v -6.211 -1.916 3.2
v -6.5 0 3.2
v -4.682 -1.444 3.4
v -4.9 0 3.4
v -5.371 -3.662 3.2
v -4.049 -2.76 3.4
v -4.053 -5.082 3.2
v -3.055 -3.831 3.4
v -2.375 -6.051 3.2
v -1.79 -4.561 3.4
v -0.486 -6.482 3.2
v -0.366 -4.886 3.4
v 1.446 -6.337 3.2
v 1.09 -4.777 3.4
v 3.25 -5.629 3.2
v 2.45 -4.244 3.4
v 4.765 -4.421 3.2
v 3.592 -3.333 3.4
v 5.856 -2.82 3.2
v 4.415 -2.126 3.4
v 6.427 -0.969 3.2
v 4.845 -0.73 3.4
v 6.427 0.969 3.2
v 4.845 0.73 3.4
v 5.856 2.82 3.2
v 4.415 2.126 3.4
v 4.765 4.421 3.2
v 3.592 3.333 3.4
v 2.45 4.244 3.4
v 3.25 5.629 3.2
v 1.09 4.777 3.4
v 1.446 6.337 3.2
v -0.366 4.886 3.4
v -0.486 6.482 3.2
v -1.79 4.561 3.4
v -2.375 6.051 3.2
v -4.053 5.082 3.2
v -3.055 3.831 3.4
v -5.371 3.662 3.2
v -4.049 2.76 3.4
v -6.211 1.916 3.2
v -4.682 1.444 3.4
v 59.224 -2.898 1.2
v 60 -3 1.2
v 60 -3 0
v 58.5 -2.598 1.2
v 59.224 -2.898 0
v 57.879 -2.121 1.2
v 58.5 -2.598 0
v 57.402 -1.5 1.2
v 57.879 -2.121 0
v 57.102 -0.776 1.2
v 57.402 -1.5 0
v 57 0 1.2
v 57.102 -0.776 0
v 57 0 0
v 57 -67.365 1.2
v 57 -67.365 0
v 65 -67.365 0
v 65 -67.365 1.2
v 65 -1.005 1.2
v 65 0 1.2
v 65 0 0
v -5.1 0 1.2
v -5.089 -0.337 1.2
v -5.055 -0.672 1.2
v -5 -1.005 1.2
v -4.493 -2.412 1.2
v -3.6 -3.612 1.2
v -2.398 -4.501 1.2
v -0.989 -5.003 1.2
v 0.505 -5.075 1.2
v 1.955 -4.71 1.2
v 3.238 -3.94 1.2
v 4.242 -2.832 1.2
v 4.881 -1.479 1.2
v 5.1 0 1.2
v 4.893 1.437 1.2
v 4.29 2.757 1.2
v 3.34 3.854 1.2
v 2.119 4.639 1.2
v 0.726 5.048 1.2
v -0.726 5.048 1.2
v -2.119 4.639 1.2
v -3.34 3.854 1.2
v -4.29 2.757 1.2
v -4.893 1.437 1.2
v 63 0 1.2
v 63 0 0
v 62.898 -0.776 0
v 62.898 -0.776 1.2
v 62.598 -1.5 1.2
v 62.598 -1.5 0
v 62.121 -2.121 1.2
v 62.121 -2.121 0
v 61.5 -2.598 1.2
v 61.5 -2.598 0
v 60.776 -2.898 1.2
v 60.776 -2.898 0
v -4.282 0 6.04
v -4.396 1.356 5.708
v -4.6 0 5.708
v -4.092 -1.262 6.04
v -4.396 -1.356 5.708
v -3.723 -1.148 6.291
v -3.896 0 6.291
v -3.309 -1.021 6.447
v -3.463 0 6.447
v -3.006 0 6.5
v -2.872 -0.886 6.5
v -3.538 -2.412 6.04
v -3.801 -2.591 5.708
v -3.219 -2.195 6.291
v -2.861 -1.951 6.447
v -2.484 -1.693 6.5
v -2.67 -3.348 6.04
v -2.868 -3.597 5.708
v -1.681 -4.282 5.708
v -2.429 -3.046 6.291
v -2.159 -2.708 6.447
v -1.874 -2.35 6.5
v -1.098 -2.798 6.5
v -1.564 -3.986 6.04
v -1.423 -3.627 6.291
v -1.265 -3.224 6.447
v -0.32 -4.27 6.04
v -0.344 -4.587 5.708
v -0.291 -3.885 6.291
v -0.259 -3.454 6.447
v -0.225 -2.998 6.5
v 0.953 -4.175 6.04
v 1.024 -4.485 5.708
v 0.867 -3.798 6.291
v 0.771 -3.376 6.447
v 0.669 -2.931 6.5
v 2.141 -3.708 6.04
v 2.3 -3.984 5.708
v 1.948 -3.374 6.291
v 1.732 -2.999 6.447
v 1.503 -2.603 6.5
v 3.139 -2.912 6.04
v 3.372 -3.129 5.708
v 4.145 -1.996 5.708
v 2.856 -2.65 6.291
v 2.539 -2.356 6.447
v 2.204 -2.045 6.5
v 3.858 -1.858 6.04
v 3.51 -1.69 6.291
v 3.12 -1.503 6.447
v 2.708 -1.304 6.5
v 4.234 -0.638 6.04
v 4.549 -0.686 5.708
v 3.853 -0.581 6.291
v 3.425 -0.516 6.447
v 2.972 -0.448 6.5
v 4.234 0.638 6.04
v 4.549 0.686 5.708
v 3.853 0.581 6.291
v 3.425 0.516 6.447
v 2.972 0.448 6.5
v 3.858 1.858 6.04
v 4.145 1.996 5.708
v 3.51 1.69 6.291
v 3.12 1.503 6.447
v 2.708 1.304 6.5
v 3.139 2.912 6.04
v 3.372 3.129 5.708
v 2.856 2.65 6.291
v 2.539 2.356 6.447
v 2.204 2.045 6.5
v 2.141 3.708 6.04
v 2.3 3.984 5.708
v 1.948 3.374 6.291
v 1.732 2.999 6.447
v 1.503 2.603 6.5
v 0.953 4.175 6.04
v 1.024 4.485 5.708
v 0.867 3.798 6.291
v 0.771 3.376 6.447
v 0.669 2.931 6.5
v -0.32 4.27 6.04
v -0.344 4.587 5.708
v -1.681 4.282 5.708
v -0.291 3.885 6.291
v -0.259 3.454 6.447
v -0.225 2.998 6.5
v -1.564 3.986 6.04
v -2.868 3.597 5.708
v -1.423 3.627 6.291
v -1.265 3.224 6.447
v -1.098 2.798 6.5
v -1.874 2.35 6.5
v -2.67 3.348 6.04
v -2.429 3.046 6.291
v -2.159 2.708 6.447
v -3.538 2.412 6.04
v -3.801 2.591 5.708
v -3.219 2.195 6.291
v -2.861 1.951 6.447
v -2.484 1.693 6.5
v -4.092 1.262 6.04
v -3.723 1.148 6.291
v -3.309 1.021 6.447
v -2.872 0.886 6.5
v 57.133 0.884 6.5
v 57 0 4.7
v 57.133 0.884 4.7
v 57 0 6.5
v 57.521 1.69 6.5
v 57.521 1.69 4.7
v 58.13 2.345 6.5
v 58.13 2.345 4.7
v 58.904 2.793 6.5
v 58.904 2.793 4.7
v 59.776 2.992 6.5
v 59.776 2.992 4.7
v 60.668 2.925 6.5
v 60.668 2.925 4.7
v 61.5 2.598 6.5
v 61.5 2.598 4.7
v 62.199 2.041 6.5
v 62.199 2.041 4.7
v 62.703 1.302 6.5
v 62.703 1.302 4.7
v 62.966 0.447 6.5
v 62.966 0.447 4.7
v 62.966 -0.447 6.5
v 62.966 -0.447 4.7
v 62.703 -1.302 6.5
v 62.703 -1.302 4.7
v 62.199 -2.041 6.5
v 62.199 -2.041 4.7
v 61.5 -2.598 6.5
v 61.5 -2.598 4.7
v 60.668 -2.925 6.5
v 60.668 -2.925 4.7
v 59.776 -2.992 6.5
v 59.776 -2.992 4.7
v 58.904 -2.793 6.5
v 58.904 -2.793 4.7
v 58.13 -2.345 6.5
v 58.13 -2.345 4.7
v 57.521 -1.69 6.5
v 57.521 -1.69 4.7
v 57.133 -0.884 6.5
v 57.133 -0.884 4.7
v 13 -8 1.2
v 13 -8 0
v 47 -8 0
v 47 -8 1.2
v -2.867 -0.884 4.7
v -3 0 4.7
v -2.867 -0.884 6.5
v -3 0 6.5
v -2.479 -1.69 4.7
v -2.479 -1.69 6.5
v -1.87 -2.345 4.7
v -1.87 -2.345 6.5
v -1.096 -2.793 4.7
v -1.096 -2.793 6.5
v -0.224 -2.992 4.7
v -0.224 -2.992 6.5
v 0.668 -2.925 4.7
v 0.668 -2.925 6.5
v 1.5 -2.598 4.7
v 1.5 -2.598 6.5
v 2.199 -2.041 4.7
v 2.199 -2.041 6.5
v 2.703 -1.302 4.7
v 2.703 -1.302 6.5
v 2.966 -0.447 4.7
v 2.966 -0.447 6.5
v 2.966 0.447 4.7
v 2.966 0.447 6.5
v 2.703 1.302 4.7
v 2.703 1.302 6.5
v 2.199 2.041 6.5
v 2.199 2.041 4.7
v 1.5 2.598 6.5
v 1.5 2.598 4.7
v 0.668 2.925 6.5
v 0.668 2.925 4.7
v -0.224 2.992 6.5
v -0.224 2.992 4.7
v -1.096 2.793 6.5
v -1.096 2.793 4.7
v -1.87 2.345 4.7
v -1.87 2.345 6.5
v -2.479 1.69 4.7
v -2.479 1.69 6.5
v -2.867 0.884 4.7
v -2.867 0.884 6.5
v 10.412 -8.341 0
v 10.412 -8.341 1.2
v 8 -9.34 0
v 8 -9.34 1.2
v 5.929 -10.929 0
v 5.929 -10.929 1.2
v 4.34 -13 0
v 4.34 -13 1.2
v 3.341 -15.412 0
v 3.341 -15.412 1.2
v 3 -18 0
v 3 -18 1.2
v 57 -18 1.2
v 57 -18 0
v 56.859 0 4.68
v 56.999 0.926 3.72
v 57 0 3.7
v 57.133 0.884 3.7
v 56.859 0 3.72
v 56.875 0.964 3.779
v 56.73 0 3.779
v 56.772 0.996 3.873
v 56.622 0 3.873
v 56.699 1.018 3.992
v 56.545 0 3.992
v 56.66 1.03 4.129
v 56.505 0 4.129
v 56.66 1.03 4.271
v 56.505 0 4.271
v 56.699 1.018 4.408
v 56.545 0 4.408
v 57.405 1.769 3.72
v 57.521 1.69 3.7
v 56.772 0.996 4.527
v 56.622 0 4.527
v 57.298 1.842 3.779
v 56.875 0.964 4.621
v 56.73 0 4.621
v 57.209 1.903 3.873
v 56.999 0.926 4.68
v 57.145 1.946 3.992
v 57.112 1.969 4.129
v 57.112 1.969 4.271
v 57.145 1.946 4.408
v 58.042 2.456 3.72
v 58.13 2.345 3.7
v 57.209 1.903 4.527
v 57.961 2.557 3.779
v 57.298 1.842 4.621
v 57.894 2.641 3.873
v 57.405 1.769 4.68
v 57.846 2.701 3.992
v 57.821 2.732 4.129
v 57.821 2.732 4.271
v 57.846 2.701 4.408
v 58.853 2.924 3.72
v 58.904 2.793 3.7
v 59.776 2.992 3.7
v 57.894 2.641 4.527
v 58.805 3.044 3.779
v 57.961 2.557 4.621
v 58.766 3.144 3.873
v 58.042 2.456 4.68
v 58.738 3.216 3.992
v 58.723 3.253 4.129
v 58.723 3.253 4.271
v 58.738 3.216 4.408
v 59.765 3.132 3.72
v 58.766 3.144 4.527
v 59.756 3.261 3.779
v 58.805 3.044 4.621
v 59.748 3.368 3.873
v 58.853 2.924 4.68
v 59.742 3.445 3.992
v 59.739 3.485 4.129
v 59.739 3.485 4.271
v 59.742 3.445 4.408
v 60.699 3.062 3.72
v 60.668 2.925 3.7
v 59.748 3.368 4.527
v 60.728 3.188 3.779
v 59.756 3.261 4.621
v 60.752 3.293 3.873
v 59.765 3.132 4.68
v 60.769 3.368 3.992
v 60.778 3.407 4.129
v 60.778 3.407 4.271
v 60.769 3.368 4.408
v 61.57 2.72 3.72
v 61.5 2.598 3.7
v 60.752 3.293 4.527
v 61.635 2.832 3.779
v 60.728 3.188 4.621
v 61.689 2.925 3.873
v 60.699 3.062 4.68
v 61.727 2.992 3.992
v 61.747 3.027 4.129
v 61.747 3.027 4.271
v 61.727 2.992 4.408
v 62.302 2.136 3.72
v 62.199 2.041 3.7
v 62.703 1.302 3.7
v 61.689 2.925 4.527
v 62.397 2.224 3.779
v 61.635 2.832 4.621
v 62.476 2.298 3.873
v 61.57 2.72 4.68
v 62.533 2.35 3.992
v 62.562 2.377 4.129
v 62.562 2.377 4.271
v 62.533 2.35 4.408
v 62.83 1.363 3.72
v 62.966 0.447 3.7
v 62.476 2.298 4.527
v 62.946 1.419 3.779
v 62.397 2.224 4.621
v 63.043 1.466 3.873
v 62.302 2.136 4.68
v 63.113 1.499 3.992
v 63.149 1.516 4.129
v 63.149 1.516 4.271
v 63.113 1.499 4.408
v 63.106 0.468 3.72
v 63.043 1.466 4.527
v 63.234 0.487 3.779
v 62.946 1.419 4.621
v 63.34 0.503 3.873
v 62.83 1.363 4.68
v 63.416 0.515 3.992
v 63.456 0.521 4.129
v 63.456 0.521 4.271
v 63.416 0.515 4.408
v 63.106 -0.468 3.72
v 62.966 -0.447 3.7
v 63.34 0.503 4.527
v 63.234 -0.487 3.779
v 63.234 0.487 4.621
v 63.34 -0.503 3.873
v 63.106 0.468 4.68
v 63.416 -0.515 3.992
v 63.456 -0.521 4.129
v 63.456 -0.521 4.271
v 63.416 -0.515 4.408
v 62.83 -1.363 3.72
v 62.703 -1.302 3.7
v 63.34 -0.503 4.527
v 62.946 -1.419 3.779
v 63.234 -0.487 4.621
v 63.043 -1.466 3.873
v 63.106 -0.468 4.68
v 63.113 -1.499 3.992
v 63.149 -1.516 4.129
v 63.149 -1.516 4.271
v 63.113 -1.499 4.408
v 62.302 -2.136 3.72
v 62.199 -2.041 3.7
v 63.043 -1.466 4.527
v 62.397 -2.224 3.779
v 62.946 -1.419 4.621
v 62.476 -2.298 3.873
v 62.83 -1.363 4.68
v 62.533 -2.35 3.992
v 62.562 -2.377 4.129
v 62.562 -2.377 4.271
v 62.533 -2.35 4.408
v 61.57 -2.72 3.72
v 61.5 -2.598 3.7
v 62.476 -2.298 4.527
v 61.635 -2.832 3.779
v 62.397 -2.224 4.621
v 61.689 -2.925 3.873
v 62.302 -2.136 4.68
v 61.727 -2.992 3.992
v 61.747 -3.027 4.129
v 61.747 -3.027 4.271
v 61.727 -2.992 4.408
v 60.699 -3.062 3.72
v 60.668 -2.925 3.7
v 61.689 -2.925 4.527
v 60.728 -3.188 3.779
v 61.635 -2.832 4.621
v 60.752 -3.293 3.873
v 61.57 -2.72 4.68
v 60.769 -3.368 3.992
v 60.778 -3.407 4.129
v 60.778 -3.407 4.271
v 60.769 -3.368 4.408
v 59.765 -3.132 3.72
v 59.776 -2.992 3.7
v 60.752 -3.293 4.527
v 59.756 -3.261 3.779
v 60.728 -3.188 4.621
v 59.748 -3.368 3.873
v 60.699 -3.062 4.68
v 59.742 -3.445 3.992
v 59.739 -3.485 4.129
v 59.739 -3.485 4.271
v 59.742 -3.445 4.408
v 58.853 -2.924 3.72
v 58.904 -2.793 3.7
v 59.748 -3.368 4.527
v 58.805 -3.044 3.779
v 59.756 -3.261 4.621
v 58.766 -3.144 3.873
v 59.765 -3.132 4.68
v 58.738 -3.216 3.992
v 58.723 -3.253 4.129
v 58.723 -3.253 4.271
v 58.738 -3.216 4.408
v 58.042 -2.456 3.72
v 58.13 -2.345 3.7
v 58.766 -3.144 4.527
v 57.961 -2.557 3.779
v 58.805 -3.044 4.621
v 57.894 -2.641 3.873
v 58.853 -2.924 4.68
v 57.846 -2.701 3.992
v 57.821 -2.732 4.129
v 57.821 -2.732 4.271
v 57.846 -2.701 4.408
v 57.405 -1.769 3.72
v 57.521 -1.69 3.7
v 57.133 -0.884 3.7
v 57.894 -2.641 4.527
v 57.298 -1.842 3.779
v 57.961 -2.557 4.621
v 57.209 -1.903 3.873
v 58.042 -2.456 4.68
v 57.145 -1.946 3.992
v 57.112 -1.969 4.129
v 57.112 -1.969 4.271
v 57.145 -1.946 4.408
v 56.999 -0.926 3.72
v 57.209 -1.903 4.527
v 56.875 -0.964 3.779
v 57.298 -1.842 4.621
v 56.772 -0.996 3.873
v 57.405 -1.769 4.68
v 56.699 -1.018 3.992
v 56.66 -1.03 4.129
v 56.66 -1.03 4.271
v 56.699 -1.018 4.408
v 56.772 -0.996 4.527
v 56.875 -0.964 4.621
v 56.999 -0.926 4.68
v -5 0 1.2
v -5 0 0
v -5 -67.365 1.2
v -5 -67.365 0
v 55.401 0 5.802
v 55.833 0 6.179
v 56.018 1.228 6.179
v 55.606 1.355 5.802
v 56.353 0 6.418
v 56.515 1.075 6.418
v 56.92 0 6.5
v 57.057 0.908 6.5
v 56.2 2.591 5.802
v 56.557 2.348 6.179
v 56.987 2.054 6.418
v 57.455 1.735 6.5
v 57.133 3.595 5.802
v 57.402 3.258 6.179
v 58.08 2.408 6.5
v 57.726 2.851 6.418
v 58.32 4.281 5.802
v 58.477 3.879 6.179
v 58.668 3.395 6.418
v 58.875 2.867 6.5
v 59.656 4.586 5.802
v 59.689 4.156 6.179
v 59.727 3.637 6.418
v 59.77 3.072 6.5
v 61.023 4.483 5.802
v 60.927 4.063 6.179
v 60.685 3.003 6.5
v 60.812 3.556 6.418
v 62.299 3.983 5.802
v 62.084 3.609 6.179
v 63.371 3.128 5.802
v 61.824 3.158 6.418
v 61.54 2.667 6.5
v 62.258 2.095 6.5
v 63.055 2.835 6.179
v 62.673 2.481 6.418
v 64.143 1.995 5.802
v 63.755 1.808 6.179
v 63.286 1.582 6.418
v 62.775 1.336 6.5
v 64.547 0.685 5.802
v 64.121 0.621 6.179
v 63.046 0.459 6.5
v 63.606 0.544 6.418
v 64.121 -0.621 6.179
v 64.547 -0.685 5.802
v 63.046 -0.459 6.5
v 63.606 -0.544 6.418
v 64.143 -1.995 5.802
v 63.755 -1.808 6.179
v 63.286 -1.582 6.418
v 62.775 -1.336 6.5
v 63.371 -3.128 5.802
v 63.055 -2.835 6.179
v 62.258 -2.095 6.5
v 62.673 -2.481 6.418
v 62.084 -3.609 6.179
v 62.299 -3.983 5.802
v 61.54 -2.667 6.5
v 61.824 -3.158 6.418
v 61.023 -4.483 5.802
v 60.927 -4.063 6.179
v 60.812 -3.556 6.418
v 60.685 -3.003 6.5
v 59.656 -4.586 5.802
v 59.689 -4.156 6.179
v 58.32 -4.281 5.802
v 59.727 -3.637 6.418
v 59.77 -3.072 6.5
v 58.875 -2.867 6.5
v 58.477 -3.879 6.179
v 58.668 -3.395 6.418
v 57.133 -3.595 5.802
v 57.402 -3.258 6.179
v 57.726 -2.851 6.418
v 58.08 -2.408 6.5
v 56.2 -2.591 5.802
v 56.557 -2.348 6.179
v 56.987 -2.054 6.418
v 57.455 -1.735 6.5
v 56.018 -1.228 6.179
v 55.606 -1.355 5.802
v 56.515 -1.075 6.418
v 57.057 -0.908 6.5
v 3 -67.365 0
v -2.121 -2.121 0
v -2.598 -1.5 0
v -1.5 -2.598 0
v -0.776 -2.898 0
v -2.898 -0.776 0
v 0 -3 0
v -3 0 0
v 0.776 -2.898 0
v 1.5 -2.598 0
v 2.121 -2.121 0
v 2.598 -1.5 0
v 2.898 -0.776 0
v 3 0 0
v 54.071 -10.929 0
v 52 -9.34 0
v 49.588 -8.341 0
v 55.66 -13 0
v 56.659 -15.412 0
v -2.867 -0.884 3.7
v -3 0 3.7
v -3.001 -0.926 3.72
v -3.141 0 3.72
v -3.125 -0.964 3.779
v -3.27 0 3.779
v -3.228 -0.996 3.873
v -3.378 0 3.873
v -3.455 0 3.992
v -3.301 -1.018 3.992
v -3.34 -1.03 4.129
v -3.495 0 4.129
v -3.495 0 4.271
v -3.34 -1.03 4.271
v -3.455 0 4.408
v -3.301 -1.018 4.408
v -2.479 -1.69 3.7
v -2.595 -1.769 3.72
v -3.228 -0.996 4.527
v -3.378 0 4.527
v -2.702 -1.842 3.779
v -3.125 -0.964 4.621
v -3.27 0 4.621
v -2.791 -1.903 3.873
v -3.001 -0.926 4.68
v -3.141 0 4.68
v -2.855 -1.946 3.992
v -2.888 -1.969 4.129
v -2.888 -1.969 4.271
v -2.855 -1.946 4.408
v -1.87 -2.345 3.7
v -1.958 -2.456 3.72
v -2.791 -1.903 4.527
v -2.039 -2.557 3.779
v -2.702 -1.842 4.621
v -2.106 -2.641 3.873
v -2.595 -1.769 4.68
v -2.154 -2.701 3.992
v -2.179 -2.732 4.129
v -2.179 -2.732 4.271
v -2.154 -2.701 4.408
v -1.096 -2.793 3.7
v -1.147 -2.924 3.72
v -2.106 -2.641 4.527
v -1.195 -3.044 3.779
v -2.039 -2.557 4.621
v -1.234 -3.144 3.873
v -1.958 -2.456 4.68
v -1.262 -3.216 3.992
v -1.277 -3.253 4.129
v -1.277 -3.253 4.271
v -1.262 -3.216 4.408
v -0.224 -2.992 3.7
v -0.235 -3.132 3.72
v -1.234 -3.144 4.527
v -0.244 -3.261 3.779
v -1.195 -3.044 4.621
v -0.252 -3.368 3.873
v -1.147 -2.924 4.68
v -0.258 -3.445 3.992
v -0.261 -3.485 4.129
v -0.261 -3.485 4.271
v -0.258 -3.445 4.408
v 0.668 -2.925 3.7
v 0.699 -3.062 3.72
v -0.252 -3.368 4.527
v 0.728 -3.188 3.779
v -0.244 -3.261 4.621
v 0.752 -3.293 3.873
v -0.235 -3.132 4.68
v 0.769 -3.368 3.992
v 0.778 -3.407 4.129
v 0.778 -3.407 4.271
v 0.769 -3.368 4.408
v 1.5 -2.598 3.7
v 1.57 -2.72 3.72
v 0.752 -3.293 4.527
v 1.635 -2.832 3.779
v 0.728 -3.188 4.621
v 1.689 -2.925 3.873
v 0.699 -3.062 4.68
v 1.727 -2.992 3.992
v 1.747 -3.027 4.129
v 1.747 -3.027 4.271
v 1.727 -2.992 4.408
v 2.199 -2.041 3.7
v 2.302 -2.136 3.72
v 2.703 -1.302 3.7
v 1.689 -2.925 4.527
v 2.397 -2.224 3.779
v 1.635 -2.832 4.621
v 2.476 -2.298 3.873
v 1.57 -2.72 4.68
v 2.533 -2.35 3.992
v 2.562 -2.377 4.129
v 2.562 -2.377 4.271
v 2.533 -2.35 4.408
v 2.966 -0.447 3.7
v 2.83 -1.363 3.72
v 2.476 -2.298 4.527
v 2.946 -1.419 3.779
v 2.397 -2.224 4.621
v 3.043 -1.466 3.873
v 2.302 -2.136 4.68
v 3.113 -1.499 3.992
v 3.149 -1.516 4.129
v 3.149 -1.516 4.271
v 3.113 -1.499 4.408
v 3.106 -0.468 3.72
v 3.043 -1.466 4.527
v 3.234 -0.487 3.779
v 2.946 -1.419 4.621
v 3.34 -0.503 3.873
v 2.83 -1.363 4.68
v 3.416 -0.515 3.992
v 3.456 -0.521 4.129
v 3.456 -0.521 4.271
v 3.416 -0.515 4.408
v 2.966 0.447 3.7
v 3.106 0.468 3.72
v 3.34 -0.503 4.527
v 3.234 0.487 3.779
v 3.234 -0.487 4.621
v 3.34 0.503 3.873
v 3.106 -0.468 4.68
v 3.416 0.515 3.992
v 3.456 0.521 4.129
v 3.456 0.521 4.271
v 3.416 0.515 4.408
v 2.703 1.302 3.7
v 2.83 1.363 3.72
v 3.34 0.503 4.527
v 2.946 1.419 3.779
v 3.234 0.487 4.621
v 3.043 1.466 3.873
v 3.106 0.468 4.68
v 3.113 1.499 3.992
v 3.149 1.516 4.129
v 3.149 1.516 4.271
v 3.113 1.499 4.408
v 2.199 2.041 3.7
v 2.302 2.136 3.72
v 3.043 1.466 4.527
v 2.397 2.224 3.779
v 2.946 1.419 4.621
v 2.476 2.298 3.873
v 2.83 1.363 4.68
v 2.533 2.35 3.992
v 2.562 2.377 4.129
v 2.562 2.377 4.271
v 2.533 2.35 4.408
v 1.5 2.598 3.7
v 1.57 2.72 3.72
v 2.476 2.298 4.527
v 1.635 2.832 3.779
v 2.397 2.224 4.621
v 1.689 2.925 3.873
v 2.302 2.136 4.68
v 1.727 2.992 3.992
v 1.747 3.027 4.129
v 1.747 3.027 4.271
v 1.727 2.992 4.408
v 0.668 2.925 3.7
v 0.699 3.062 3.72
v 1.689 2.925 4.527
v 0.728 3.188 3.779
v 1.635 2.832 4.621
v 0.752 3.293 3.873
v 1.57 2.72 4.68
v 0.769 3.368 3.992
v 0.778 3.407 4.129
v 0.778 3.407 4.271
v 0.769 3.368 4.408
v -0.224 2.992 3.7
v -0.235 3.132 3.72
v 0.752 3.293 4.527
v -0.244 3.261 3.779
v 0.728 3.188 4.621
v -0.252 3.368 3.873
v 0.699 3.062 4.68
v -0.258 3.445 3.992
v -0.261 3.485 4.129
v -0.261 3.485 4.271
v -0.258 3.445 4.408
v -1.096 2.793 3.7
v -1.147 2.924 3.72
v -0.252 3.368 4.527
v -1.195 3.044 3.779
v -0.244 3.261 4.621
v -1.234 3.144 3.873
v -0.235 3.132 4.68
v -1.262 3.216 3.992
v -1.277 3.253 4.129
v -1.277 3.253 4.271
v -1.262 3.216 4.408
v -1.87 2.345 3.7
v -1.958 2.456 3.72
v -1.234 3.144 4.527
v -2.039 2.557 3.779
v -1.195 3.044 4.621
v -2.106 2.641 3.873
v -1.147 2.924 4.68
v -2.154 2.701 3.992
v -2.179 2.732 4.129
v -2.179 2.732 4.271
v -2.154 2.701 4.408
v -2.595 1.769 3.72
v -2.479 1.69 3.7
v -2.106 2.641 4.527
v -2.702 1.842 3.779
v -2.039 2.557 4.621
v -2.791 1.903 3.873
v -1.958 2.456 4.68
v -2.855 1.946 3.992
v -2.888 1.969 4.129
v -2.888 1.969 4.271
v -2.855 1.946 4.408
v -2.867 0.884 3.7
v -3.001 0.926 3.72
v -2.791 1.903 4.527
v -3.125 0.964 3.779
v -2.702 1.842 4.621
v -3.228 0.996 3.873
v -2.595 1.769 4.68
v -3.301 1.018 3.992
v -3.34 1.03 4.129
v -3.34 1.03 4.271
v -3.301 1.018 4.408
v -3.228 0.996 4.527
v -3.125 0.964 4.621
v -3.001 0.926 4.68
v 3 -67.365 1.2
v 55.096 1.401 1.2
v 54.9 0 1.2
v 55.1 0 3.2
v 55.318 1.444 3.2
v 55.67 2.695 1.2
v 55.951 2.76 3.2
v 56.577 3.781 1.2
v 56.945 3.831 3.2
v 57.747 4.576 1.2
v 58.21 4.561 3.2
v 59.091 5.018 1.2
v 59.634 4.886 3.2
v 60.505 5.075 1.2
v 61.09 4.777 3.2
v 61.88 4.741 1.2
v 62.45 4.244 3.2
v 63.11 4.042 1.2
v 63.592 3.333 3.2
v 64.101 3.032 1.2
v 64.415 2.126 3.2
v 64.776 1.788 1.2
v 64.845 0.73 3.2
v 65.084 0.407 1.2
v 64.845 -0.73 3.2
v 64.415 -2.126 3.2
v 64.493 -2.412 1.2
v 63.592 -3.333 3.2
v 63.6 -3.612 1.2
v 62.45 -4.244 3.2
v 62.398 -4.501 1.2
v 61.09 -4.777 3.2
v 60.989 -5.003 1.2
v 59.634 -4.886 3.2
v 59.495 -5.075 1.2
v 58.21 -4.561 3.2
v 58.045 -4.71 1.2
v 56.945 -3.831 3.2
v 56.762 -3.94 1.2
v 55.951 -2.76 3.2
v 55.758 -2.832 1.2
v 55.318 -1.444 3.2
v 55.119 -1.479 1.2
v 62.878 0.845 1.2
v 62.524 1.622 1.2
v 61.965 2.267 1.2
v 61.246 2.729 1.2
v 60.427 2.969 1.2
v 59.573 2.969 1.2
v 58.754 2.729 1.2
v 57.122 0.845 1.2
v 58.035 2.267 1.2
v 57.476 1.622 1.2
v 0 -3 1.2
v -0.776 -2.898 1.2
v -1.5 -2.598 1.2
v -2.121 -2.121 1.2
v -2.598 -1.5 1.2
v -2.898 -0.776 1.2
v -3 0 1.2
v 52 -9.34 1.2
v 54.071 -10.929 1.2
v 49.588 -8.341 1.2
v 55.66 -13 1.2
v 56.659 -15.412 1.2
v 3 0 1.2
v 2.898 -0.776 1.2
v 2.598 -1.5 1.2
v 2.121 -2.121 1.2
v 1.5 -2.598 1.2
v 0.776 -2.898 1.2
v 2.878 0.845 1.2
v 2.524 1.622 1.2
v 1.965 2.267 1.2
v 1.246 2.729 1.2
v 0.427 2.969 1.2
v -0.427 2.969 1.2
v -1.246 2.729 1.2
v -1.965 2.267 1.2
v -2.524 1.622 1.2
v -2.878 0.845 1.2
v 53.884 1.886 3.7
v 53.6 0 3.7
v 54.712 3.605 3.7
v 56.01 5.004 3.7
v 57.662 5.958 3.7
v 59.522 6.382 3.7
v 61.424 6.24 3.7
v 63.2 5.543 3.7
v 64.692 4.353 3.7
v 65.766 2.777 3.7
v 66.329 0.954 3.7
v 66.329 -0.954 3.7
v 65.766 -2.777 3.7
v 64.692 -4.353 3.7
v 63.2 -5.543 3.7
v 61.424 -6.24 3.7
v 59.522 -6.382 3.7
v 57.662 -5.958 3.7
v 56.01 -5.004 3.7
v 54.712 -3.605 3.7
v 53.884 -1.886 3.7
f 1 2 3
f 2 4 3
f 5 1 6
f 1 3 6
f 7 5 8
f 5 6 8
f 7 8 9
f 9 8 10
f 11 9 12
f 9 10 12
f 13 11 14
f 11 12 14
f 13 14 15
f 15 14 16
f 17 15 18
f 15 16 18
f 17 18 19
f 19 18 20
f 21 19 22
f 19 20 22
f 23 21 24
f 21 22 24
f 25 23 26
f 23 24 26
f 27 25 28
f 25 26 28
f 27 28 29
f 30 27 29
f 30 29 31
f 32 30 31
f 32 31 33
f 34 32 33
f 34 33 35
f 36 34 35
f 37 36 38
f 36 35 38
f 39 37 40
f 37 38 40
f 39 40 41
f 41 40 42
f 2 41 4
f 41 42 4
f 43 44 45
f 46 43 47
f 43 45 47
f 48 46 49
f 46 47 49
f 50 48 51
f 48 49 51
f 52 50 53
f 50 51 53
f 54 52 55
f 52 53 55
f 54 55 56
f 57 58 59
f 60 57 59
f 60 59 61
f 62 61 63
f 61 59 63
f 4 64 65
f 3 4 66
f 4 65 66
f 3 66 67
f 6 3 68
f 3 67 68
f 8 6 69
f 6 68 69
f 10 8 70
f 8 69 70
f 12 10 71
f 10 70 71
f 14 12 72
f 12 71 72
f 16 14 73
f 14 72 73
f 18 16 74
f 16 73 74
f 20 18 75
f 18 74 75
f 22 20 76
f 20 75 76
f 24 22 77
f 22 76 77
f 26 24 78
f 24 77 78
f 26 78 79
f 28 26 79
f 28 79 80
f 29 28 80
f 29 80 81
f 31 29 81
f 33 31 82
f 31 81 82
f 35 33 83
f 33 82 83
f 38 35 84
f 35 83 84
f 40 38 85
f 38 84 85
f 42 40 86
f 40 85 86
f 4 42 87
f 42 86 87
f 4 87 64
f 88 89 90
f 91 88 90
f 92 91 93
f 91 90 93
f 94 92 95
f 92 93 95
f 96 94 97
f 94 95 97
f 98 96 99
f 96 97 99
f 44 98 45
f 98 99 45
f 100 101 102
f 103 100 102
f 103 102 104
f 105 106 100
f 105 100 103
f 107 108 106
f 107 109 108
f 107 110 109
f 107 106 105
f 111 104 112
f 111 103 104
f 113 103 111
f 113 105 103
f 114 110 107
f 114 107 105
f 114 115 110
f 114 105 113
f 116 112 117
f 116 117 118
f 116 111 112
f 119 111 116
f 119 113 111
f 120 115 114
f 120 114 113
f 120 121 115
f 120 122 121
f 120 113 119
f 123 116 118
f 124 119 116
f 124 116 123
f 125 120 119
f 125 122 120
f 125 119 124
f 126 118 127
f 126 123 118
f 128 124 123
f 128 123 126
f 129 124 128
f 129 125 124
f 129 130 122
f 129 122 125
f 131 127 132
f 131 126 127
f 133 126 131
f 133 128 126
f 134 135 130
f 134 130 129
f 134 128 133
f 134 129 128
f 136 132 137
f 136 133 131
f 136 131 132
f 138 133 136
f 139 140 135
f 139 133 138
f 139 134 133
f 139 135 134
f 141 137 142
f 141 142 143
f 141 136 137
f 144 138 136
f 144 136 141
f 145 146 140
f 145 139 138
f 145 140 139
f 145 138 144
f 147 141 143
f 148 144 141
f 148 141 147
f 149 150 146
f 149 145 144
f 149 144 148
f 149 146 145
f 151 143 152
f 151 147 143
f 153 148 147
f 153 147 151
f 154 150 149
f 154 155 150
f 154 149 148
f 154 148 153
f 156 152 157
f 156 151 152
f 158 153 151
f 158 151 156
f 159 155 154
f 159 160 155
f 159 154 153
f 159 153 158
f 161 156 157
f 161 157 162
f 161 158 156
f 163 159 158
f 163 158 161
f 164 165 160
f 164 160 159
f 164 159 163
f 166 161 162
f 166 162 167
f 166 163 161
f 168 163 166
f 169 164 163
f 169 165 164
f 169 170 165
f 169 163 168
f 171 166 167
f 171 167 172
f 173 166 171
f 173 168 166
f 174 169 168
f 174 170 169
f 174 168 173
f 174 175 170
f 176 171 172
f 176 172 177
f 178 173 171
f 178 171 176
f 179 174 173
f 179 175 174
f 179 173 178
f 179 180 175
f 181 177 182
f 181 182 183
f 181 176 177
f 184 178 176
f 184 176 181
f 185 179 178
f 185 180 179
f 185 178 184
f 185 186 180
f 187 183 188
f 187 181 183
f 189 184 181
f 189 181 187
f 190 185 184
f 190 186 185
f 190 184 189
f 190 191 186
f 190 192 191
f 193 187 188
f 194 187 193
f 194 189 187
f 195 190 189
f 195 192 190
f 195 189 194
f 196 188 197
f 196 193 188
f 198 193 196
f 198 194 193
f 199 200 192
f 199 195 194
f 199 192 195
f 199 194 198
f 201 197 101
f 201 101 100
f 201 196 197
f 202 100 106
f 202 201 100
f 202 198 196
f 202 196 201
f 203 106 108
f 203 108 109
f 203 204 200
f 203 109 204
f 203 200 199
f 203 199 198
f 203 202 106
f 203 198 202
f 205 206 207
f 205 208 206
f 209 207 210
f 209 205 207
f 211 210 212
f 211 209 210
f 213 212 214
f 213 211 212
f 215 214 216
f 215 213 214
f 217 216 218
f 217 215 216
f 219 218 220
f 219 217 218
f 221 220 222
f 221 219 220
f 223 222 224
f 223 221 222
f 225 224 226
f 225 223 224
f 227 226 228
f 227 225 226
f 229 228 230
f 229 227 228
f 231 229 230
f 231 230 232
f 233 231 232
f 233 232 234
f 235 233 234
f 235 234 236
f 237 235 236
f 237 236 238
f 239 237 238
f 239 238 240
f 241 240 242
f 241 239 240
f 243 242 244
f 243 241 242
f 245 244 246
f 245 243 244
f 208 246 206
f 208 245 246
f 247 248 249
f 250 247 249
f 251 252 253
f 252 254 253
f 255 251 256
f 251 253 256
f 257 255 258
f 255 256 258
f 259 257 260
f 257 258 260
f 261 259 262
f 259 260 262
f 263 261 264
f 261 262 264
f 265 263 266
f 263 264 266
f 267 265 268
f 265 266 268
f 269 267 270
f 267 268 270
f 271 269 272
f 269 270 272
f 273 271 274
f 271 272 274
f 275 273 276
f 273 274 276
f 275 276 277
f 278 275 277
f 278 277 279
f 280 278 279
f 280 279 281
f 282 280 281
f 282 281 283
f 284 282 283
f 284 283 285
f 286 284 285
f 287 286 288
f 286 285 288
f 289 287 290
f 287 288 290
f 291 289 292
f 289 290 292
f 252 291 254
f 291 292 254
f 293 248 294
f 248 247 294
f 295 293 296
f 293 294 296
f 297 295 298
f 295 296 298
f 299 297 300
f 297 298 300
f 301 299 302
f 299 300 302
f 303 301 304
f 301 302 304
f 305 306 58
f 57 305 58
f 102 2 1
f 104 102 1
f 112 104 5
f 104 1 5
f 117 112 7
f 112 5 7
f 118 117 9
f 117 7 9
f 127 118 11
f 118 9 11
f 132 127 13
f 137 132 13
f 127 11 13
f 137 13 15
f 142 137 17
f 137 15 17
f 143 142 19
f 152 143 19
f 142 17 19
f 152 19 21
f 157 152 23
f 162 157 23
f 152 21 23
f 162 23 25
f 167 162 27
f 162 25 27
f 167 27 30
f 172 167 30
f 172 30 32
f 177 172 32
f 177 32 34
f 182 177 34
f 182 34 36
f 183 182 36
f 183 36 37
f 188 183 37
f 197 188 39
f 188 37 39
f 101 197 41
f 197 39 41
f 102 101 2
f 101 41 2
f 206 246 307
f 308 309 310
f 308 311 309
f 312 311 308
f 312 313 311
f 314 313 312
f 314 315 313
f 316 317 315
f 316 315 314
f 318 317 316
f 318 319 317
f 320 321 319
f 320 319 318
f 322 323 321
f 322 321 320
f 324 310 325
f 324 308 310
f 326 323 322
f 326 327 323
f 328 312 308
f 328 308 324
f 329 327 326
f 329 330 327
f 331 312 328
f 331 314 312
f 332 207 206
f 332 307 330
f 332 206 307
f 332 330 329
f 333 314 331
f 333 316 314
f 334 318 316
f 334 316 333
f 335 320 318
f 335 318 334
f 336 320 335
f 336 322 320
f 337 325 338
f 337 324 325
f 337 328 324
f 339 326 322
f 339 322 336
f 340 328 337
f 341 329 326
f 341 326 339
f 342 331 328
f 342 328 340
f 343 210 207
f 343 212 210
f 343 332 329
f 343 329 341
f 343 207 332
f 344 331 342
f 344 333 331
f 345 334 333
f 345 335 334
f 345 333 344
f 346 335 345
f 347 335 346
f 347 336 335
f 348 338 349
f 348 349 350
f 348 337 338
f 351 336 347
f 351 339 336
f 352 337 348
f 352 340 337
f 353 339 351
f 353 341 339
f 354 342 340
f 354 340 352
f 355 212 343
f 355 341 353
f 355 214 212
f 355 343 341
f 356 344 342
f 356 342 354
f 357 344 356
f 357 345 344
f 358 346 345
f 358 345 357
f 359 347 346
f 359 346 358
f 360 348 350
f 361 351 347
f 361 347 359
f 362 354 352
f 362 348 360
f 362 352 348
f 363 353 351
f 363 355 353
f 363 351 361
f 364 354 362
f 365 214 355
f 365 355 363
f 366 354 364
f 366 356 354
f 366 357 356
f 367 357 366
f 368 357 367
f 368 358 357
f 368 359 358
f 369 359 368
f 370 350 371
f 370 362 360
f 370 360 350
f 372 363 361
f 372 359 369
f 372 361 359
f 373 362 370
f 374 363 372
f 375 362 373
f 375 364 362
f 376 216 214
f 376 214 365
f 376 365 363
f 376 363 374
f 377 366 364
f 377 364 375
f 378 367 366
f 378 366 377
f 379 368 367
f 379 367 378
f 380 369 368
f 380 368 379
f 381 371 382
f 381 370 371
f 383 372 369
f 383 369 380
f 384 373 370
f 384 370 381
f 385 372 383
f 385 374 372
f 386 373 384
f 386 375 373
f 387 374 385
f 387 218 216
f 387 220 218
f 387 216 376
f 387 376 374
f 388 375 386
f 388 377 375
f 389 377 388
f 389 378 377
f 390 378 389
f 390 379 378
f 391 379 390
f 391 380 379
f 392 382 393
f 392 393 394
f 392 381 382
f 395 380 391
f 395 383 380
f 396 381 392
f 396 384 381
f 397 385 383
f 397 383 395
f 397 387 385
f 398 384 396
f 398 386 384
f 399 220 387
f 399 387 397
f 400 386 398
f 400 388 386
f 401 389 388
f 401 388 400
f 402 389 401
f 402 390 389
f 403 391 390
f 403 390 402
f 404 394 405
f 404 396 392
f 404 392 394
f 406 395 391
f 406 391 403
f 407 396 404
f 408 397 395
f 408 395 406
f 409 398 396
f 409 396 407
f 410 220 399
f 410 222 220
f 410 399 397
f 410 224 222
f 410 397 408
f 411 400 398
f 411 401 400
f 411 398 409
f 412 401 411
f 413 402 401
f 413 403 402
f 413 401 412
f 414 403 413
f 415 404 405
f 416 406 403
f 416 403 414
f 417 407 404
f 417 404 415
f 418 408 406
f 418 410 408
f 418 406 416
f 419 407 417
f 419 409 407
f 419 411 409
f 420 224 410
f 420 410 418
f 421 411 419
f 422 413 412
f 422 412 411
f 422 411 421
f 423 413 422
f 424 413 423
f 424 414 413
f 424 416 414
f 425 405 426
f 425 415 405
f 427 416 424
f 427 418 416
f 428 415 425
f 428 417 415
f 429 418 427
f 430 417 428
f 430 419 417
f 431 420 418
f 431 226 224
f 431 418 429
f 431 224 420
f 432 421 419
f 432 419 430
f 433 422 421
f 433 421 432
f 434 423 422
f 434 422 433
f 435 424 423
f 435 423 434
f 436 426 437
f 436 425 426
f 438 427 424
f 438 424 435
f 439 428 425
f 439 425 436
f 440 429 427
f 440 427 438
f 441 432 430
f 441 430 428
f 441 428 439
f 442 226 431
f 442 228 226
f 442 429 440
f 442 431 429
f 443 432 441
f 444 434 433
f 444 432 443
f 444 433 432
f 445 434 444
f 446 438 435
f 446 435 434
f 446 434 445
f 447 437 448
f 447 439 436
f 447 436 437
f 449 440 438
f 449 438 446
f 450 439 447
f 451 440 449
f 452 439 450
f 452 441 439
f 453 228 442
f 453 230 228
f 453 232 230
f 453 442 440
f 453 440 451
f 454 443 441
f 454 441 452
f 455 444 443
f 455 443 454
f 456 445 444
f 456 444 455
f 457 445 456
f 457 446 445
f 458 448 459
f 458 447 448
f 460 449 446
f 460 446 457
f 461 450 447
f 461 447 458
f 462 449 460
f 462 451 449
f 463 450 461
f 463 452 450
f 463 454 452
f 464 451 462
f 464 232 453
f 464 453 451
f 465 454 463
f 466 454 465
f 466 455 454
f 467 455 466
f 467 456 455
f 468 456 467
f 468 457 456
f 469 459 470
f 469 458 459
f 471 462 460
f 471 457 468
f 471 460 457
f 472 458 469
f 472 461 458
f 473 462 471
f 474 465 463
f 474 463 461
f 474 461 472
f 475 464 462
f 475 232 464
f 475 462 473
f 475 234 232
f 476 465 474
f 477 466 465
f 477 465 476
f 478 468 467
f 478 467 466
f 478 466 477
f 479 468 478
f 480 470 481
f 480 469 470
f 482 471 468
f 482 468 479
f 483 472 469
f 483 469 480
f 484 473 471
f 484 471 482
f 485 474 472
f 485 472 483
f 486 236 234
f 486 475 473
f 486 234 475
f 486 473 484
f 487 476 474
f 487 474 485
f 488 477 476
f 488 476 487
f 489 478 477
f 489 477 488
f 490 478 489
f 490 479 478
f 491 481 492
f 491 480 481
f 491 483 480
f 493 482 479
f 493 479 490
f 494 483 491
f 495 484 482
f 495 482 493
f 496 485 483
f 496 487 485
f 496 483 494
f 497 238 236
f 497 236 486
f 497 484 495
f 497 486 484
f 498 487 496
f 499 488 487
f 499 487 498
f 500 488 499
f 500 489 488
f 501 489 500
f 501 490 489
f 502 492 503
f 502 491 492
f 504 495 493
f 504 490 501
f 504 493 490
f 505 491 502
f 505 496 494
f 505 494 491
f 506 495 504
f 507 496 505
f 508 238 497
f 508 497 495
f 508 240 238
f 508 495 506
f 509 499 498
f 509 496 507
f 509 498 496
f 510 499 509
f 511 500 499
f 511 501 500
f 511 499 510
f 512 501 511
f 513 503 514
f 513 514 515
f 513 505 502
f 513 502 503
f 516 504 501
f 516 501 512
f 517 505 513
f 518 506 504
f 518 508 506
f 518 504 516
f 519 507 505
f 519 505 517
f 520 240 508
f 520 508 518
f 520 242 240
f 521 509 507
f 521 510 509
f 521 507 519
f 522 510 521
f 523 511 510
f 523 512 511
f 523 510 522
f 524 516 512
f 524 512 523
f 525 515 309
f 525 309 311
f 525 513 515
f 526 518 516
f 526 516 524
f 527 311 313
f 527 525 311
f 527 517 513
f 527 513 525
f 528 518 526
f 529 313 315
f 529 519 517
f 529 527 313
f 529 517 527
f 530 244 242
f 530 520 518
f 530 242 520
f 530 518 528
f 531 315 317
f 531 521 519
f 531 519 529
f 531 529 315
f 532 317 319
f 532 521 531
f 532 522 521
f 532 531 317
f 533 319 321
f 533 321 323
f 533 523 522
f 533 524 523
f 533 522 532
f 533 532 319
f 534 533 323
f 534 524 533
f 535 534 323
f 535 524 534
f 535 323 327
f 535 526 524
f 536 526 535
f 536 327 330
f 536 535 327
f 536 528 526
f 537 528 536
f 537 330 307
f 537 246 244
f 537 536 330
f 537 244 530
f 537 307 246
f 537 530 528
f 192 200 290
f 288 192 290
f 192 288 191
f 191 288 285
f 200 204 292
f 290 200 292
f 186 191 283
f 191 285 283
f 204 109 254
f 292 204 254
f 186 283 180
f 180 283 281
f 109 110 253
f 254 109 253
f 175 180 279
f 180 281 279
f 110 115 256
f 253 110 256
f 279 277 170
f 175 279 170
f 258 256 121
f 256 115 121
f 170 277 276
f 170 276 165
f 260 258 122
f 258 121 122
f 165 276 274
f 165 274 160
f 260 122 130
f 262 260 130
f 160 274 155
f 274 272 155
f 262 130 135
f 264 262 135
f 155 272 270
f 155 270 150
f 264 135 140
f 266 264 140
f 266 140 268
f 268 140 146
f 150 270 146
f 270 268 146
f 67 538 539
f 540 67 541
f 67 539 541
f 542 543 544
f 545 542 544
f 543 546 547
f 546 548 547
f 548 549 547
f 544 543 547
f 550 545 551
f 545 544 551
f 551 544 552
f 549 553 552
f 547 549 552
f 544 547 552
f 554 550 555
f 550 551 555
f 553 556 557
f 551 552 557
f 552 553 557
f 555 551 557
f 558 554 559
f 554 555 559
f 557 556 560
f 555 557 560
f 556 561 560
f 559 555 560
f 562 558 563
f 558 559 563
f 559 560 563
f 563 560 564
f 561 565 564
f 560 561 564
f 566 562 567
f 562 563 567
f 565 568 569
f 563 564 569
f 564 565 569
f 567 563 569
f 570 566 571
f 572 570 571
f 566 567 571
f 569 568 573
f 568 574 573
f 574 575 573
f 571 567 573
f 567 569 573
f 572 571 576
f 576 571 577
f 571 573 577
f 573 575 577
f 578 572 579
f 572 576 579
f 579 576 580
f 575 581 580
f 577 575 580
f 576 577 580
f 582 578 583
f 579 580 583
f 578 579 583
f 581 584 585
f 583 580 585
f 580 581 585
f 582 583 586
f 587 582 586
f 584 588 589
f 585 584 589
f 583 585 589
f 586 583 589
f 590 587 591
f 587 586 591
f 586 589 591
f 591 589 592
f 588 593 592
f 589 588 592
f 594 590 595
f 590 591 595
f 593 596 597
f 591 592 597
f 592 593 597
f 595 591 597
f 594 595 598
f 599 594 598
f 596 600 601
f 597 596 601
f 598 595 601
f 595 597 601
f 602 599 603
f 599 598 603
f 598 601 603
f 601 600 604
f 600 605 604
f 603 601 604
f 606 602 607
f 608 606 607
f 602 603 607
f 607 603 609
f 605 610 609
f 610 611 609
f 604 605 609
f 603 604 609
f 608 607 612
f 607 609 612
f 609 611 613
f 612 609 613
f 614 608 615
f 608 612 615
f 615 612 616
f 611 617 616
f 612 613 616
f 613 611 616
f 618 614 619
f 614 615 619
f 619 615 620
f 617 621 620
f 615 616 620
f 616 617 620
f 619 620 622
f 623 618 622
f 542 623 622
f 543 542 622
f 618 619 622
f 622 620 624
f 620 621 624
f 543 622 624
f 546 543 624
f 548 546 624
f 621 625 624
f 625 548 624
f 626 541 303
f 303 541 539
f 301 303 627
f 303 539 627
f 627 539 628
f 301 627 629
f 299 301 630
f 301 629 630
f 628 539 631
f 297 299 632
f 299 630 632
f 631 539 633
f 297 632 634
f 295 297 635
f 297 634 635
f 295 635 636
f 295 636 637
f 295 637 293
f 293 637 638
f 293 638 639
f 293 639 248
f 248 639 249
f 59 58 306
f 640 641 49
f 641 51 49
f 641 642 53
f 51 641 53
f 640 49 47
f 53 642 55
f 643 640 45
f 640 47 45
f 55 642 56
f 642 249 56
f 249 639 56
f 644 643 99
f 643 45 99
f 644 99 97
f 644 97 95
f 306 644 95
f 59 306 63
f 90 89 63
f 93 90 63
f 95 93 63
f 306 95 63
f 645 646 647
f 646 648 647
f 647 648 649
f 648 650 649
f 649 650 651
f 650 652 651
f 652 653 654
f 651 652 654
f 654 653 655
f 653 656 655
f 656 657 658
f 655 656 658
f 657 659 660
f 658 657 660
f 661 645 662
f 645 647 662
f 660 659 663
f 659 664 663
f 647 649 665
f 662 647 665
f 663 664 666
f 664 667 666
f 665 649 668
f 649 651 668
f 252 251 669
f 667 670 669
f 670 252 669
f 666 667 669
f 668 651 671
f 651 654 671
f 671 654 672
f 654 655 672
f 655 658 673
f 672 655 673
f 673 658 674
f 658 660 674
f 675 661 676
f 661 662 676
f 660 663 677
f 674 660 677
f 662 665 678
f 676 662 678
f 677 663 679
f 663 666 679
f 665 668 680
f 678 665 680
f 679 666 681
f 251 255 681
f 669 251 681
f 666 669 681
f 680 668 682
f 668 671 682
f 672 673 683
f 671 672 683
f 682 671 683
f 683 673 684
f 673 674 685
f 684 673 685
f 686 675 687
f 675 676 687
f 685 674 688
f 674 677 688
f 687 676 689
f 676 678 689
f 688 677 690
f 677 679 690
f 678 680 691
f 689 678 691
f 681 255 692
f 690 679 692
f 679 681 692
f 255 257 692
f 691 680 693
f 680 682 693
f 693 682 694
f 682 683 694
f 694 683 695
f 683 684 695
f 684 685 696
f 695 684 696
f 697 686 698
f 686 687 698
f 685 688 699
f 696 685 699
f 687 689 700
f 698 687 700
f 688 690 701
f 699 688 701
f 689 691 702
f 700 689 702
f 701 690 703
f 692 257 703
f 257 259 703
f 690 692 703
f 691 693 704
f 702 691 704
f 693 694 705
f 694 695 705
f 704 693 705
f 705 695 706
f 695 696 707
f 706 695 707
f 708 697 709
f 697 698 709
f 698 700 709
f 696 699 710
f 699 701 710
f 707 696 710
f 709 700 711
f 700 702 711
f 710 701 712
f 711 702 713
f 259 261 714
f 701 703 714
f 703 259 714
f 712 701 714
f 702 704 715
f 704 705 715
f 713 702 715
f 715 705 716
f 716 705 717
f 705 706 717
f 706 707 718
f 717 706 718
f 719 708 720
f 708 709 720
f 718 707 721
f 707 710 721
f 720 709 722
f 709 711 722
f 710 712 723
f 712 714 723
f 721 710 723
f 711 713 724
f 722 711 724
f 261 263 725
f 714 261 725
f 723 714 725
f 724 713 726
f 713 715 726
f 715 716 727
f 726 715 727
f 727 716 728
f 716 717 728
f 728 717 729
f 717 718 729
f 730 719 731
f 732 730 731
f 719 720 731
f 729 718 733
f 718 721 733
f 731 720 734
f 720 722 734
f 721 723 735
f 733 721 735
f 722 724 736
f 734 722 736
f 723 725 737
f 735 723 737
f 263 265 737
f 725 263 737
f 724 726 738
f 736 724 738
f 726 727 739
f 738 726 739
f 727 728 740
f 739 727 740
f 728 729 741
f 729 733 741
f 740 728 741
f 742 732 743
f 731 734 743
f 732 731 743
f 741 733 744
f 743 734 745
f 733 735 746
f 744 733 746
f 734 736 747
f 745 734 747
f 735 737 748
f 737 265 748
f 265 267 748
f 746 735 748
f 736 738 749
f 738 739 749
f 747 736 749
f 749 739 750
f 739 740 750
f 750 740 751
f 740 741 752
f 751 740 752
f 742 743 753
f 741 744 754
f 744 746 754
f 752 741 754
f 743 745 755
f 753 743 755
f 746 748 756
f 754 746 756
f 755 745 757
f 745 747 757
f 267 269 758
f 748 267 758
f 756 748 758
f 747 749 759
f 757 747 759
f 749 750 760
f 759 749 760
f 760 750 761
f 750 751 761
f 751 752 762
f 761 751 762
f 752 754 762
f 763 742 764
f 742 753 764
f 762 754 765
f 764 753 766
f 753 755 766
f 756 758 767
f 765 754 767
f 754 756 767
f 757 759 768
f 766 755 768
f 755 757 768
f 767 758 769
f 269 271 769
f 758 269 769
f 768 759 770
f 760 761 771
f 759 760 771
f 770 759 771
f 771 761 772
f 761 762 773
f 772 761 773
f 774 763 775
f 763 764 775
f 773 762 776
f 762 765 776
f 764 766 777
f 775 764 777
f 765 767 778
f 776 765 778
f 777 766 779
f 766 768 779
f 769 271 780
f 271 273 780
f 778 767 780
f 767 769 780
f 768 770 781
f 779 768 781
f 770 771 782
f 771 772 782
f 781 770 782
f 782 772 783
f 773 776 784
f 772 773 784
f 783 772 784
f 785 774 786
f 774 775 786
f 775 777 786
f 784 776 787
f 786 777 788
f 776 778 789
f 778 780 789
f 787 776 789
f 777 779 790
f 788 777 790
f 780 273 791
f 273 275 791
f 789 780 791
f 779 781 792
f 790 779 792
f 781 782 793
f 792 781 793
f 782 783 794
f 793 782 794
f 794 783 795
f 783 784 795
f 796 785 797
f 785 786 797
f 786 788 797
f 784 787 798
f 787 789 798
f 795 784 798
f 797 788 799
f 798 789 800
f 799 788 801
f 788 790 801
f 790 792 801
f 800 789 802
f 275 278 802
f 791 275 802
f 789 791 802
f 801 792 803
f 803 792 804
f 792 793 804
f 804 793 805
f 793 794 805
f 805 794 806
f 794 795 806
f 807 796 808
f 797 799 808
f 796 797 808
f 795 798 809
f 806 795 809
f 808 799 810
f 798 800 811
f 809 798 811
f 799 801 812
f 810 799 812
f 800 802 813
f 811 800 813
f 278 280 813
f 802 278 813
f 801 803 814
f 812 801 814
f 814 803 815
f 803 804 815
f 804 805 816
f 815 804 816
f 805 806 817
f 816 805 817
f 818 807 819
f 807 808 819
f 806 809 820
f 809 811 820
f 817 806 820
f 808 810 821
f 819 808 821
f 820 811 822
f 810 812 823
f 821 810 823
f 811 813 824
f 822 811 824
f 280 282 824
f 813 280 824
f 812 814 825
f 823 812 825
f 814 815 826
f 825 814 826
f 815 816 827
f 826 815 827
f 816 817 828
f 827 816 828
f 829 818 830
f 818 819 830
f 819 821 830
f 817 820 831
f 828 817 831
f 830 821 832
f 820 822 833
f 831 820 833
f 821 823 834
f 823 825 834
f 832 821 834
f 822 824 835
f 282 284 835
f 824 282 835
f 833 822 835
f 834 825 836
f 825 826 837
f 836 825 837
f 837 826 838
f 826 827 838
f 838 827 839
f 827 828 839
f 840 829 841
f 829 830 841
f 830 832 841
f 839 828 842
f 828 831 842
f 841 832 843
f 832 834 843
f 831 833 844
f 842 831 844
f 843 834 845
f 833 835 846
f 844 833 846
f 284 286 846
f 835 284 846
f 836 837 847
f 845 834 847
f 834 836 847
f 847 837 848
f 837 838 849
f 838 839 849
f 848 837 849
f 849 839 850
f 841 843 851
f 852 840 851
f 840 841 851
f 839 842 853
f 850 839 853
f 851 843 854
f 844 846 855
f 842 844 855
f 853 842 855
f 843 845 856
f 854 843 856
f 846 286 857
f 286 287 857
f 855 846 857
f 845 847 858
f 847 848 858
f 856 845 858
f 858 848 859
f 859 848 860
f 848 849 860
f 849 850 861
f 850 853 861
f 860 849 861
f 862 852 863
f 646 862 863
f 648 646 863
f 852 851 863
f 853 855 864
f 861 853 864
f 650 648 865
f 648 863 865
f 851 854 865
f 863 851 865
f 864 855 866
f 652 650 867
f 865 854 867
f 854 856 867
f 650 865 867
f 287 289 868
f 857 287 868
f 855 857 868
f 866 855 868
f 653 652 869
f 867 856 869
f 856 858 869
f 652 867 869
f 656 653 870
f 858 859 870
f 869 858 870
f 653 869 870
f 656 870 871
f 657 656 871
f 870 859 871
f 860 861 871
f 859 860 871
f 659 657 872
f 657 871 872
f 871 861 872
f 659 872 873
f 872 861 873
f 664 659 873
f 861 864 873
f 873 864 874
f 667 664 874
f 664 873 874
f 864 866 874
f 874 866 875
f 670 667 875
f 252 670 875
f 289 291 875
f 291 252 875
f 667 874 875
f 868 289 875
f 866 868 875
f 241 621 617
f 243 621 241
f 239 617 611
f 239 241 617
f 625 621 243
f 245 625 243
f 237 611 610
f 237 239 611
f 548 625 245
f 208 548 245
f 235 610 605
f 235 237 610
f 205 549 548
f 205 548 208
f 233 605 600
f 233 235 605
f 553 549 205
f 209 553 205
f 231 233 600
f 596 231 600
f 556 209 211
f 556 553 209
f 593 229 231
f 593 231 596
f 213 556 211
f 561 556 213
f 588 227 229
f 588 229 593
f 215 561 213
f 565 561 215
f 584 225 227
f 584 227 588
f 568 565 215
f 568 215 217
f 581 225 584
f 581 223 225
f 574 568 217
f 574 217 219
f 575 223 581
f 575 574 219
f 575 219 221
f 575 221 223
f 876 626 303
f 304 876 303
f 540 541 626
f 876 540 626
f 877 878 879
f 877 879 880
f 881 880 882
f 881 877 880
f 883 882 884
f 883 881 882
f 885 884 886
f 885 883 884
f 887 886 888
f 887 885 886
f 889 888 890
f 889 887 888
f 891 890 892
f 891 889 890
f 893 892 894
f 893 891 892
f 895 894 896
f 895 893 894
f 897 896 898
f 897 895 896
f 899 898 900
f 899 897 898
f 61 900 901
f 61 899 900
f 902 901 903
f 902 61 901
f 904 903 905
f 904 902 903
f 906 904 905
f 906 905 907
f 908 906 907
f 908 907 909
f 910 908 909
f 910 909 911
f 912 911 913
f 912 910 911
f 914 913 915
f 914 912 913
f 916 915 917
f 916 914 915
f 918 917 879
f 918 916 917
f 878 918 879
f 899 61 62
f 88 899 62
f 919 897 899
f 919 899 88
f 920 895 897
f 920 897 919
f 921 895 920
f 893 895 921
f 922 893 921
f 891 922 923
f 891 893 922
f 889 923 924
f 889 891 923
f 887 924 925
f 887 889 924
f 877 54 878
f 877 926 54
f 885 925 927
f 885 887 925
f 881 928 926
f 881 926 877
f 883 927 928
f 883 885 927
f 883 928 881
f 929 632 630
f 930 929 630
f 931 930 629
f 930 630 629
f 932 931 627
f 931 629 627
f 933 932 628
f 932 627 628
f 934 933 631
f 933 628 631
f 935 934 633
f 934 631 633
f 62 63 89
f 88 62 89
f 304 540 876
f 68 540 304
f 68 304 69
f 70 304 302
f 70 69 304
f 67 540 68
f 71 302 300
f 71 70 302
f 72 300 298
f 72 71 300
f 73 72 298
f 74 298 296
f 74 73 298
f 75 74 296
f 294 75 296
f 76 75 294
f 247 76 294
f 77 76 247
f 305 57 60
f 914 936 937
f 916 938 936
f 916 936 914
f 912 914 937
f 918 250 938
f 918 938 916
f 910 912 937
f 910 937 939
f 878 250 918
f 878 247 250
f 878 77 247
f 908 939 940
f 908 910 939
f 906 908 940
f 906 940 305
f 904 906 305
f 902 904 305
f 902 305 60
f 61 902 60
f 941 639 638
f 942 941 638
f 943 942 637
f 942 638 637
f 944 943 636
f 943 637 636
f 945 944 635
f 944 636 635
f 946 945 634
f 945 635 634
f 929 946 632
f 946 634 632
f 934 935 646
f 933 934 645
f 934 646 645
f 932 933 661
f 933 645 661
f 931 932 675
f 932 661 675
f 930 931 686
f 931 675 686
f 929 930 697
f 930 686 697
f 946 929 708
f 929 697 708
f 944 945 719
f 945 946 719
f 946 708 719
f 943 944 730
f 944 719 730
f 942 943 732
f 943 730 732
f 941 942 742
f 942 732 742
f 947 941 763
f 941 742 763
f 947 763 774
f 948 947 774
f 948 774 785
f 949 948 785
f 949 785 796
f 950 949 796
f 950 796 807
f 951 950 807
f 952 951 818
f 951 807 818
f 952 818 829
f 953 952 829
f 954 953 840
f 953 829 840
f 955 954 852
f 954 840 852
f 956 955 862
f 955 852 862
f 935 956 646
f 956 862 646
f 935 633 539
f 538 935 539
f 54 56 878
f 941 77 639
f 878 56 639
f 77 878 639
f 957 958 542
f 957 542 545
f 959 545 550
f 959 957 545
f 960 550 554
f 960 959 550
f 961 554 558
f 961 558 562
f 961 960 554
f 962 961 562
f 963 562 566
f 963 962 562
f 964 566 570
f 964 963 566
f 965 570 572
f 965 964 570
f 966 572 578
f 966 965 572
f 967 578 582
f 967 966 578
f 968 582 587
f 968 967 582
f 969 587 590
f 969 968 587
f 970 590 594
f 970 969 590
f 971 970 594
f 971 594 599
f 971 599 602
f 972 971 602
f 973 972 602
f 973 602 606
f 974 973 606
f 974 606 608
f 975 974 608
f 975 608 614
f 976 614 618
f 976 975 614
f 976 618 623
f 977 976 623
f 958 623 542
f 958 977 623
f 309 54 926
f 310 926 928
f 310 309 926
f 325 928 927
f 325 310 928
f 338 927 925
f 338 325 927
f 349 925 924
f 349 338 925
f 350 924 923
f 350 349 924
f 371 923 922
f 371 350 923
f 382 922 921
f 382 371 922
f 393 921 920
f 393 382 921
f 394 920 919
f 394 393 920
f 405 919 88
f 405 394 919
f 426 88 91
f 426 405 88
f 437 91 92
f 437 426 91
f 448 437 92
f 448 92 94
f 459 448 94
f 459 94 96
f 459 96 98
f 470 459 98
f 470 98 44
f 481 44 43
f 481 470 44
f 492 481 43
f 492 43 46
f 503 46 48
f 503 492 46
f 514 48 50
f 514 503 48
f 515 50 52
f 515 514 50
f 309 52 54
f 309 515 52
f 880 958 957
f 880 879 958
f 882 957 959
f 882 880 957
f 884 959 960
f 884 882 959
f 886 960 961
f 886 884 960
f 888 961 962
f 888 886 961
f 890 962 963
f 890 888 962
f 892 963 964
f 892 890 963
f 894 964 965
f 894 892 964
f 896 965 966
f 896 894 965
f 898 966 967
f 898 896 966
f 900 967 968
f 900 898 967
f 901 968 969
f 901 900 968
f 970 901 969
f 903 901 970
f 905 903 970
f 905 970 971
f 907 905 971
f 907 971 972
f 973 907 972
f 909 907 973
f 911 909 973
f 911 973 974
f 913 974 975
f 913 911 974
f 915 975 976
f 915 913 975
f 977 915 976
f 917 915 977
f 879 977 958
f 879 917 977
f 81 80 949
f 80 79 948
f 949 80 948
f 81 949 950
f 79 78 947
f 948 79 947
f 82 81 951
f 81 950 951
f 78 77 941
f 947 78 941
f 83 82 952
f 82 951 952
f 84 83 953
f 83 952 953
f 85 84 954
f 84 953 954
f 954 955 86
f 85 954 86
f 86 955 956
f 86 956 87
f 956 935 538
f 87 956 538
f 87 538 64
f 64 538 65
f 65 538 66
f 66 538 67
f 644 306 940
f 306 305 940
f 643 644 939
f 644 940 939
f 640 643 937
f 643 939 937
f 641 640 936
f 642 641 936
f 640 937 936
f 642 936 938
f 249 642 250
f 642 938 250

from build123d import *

# Parameters (mm, degrees)
F5_DEPTH = 1.2
F6_R     = 2
F7_R     = 2
F8_R     = 10


with BuildPart() as f1:
    # F0 (on Front) → F1 (revolve)
    with BuildSketch(Plane.XZ):
        with BuildLine():
            Line((-3, 4.7), (-3, 6.5))
            Line((-3, 6.5), (-4, 6.5))
            Line((-4, 6.5), (-6.5, 3.2))
            Line((-6.5, 3.2), (-4.9, 3.4))
            Line((-4.9, 3.4), (-5.1, 1.2))
            Line((-5.1, 1.2), (-3, 1.2))
            Line((-3, 1.2), (-3, 3.7))
            ThreePointArc((-3, 3.7), (-3.5, 4.2), (-3, 4.7))
        make_face()
    revolve(axis=Axis((0, 0, 2.8096139431), (0, 0, 1)))



with BuildPart() as f3:
    # F2 (on Front) → F3 (revolve)
    with BuildSketch(Plane.XZ):
        with BuildLine():
            Line((54.9, 1.2), (57, 1.2))
            Line((57, 1.2), (57, 3.7))
            ThreePointArc((57, 3.7), (56.5, 4.2), (57, 4.7))
            Line((57, 4.7), (57, 6.5))
            Line((57, 6.5), (56, 6.5))
            Line((56, 6.5), (53.6, 3.7))
            Line((53.6, 3.7), (55.1, 3.2))
            Line((55.1, 3.2), (54.9, 1.2))
        make_face()
    revolve(axis=Axis((60, 0, -5.4624276236), (0, 0, -1)))


with BuildPart() as f1_1:
    add(f1.part)

    add(f3.part)  # F5 merges F3
    # F4 (on Top) → F5 (join)
    with BuildSketch(Plane.XY):
        with BuildLine():
            Line((-5, 0), (-5, -8))
            Line((-5, -8), (-5, -67.365))
            Line((-5, -67.365), (3, -67.365))
            Line((3, -67.365), (3, -8))
            Line((3, -8), (57, -8))
            Line((57, -8), (57, -67.365))
            Line((57, -67.365), (65, -67.365))
            Line((65, -67.365), (65, -8))
            Line((65, -8), (65, 0))
            Line((65, 0), (63, 0))
            ThreePointArc((63, 0), (62.1213203436, -2.1213203436), (60, -3))
            ThreePointArc((60, -3), (57.8786796564, -2.1213203436), (57, 0))
            Line((57, 0), (3, 0))
            ThreePointArc((3, 0), (2.1213203436, -2.1213203436), (0, -3))
            ThreePointArc((0, -3), (-2.1213203436, -2.1213203436), (-3, 0))
            Line((-3, 0), (-5, 0))
        make_face()
    extrude(amount=F5_DEPTH)

    # F6
    f6_edges = [f1_1.edges().sort_by_distance(p)[0] for p in [
        (64, 0, 6.5),
    ]]
    fillet(f6_edges, radius=F6_R)

    # F7
    f7_edges = [f1_1.edges().sort_by_distance(p)[0] for p in [
        (4, 0, 6.5),
    ]]
    fillet(f7_edges, radius=F7_R)

    # F8
    f8_edges = [f1_1.edges().sort_by_distance(p)[0] for p in [
        (3, -8, 0.6),
        (57, -8, 0.6),
    ]]
    fillet(f8_edges, radius=F8_R)


solid = f1_1.part
